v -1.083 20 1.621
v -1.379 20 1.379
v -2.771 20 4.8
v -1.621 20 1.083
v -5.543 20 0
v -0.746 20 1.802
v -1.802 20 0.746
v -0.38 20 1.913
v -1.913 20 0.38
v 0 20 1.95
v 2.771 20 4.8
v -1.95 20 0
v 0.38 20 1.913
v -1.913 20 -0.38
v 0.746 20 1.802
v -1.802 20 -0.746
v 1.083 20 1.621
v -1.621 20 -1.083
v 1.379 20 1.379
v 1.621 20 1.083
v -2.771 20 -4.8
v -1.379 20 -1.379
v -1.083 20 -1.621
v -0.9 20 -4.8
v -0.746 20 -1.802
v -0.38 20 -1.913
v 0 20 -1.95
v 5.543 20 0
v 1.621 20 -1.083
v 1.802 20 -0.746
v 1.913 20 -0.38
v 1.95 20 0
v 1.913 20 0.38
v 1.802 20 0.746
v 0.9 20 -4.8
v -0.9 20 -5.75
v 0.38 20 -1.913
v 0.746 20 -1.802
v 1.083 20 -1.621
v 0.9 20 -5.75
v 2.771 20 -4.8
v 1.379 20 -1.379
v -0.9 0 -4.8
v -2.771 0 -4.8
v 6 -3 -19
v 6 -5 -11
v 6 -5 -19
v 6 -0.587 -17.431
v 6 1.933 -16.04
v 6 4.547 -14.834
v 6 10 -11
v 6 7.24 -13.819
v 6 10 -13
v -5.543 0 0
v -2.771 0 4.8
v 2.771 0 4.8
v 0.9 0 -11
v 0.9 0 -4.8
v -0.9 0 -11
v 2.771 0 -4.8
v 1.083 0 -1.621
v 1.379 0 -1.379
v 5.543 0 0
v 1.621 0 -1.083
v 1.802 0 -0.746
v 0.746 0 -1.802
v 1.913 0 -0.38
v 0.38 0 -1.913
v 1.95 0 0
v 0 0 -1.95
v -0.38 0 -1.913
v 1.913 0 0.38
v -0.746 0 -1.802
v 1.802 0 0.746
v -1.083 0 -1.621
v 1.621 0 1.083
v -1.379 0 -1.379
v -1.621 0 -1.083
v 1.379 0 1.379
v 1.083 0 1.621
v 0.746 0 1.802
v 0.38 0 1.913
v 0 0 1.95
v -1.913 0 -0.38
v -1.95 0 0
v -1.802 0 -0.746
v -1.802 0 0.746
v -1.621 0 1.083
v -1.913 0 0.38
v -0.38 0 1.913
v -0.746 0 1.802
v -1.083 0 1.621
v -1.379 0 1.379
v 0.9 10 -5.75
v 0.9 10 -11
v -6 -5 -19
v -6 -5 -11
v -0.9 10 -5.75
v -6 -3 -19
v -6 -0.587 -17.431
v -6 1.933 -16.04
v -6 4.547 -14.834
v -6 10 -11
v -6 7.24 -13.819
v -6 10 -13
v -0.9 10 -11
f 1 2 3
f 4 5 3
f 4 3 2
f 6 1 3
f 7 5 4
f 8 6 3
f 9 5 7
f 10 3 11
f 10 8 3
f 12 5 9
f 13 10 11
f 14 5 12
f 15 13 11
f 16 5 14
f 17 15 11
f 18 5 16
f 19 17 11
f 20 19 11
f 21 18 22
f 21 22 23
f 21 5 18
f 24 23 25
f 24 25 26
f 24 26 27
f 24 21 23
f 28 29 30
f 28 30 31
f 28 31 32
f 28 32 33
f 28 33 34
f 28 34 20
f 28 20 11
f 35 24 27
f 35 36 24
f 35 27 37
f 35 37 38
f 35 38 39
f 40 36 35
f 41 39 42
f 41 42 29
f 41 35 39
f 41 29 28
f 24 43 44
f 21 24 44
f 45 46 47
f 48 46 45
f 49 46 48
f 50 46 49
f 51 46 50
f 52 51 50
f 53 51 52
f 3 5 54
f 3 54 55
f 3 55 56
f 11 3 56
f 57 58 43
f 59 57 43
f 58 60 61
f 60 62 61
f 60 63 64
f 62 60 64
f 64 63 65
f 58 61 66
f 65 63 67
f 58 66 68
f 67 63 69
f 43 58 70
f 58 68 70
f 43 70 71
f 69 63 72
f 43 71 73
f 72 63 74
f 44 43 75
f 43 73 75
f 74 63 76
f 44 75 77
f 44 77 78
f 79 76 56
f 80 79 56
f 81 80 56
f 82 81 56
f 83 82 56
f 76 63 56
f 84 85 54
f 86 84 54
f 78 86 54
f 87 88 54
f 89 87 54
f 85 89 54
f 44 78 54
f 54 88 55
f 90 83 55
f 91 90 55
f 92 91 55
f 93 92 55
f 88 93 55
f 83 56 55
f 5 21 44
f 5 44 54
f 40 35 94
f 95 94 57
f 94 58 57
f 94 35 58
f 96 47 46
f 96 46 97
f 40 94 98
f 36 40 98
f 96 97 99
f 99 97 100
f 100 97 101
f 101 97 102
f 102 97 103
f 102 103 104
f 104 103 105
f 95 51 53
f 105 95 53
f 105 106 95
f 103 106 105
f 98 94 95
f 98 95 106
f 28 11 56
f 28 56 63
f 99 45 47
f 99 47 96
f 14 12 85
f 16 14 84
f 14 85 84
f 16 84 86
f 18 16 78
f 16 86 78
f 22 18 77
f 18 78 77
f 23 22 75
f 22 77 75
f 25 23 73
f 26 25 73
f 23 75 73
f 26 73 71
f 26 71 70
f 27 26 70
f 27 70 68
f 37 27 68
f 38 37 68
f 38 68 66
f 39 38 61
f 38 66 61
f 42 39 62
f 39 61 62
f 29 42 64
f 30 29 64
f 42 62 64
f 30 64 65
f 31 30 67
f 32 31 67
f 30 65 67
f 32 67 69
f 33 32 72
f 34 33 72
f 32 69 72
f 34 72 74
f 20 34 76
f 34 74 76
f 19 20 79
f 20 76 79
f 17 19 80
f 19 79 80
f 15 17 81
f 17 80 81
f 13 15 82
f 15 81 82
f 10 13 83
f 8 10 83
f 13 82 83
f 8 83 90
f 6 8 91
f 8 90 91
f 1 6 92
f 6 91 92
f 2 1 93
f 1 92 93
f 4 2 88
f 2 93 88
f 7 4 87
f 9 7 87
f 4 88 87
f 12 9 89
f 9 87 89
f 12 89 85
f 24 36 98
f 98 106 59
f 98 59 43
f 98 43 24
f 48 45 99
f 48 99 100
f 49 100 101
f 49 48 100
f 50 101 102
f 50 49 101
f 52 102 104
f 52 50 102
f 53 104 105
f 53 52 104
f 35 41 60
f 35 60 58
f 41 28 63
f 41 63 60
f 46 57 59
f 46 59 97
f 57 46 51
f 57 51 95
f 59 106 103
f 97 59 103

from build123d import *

# Parameters (mm, degrees)
BOSS_EXTRUDE1_DEPTH = 20
SKETCH4_R           = 1.95
CUT_EXTRUDE1_DEPTH  = 20
BOSS_EXTRUDE2_DEPTH = 10
SKETCH8_W           = 12
SKETCH8_H           = 8
BOSS_EXTRUDE3_DEPTH = 5
CUT_EXTRUDE3_REACH  = 14


with BuildPart() as part:
    # Sketch2 → Boss-Extrude1 (new body)
    with BuildSketch(Plane(origin=(0, 0, 0), x_dir=(1, 0, 0), z_dir=(0, 1, 0))):
        Polygon((5.542562584, 0), (2.771281292, 4.8), (0.9, 4.8), (0.9, 5.75), (-0.9, 5.75), (-0.9, 4.8), (-2.771281292, 4.8), (-5.542562584, 0), (-2.771281292, -4.8), (2.771281292, -4.8), align=None)
    extrude(amount=BOSS_EXTRUDE1_DEPTH)

    # Sketch4 → Cut-Extrude1 (cut)
    with BuildSketch(Plane(origin=(0, 0, 0), x_dir=(-1, 0, 0), z_dir=(0, -1, 0))):
        Circle(SKETCH4_R)
    extrude(amount=-CUT_EXTRUDE1_DEPTH, mode=Mode.SUBTRACT)

    # Sketch6 → Boss-Extrude2 (add)
    with BuildSketch(Plane.XZ):
        Polygon((0.9, -5.75), (0.9, -11), (6, -11), (6, -19), (-6, -19), (-6, -11), (-0.9, -11), (-0.9, -5.75), align=None)
    extrude(amount=-BOSS_EXTRUDE2_DEPTH)

    # Sketch8 → Boss-Extrude3 (add)
    with BuildSketch(Plane(origin=(0, 0, 0), x_dir=(-1, 0, 0), z_dir=(0, -1, 0))):
        with Locations((0, 15)):
            Rectangle(SKETCH8_W, SKETCH8_H)
    extrude(amount=BOSS_EXTRUDE3_DEPTH)

    # Sketch9 → Cut-Extrude3 (cut, up to next)
    with BuildSketch(Plane(origin=(6, 0, 0), x_dir=(0, 0, -1), z_dir=(1, 0, 0)), mode=Mode.PRIVATE) as cut_extrude3_sk1:
        with BuildLine():
            Line((13, 10), (19, 10))
            Line((19, 10), (19, -3))
            ThreePointArc((19, -3), (15.413604557, 3.22935595), (13, 10))
        make_face()
    cut_extrude3_tool1 = extrude(cut_extrude3_sk1.sketch, amount=-CUT_EXTRUDE3_REACH, mode=Mode.PRIVATE) & part.part
    add(cut_extrude3_tool1.solids().sort_by_distance((6, 5.355709, -16.831232))[0], mode=Mode.SUBTRACT)


solid = part.part
